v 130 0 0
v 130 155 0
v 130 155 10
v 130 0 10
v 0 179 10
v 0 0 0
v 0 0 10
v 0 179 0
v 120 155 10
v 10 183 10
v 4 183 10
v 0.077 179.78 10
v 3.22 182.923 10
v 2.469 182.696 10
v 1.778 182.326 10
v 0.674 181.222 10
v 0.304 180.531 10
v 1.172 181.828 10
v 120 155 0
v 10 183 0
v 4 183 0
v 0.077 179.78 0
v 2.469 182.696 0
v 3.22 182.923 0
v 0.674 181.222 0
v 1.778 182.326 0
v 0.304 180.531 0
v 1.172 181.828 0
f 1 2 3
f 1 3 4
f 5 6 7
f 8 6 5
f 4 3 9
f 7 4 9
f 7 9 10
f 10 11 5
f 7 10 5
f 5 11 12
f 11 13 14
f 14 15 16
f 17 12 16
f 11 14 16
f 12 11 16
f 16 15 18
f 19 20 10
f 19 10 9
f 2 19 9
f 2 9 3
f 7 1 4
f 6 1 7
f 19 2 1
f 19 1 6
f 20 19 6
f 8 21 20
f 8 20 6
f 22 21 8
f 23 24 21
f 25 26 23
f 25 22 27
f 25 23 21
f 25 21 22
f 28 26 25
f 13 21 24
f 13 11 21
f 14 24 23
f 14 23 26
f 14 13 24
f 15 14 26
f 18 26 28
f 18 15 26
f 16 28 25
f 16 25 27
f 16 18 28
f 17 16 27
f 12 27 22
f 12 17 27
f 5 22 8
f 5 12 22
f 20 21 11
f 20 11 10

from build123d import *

# Parameters (mm, degrees)
BOSS_EXTRU_1_DEPTH = 10
CONG_1_R           = 4


with BuildPart() as part:
    # Esquisse1 → Boss.-Extru.1 (new body)
    with BuildSketch(Plane.XY):
        Polygon((0, 183), (10, 183), (120, 155), (130, 155), (130, 0), (0, 0), align=None)
    extrude(amount=BOSS_EXTRU_1_DEPTH)

    # Congé1
    cong_1_edges = [part.edges().sort_by_distance(p)[0] for p in [
        (0, 183, 5),
    ]]
    fillet(cong_1_edges, radius=CONG_1_R)


solid = part.part
